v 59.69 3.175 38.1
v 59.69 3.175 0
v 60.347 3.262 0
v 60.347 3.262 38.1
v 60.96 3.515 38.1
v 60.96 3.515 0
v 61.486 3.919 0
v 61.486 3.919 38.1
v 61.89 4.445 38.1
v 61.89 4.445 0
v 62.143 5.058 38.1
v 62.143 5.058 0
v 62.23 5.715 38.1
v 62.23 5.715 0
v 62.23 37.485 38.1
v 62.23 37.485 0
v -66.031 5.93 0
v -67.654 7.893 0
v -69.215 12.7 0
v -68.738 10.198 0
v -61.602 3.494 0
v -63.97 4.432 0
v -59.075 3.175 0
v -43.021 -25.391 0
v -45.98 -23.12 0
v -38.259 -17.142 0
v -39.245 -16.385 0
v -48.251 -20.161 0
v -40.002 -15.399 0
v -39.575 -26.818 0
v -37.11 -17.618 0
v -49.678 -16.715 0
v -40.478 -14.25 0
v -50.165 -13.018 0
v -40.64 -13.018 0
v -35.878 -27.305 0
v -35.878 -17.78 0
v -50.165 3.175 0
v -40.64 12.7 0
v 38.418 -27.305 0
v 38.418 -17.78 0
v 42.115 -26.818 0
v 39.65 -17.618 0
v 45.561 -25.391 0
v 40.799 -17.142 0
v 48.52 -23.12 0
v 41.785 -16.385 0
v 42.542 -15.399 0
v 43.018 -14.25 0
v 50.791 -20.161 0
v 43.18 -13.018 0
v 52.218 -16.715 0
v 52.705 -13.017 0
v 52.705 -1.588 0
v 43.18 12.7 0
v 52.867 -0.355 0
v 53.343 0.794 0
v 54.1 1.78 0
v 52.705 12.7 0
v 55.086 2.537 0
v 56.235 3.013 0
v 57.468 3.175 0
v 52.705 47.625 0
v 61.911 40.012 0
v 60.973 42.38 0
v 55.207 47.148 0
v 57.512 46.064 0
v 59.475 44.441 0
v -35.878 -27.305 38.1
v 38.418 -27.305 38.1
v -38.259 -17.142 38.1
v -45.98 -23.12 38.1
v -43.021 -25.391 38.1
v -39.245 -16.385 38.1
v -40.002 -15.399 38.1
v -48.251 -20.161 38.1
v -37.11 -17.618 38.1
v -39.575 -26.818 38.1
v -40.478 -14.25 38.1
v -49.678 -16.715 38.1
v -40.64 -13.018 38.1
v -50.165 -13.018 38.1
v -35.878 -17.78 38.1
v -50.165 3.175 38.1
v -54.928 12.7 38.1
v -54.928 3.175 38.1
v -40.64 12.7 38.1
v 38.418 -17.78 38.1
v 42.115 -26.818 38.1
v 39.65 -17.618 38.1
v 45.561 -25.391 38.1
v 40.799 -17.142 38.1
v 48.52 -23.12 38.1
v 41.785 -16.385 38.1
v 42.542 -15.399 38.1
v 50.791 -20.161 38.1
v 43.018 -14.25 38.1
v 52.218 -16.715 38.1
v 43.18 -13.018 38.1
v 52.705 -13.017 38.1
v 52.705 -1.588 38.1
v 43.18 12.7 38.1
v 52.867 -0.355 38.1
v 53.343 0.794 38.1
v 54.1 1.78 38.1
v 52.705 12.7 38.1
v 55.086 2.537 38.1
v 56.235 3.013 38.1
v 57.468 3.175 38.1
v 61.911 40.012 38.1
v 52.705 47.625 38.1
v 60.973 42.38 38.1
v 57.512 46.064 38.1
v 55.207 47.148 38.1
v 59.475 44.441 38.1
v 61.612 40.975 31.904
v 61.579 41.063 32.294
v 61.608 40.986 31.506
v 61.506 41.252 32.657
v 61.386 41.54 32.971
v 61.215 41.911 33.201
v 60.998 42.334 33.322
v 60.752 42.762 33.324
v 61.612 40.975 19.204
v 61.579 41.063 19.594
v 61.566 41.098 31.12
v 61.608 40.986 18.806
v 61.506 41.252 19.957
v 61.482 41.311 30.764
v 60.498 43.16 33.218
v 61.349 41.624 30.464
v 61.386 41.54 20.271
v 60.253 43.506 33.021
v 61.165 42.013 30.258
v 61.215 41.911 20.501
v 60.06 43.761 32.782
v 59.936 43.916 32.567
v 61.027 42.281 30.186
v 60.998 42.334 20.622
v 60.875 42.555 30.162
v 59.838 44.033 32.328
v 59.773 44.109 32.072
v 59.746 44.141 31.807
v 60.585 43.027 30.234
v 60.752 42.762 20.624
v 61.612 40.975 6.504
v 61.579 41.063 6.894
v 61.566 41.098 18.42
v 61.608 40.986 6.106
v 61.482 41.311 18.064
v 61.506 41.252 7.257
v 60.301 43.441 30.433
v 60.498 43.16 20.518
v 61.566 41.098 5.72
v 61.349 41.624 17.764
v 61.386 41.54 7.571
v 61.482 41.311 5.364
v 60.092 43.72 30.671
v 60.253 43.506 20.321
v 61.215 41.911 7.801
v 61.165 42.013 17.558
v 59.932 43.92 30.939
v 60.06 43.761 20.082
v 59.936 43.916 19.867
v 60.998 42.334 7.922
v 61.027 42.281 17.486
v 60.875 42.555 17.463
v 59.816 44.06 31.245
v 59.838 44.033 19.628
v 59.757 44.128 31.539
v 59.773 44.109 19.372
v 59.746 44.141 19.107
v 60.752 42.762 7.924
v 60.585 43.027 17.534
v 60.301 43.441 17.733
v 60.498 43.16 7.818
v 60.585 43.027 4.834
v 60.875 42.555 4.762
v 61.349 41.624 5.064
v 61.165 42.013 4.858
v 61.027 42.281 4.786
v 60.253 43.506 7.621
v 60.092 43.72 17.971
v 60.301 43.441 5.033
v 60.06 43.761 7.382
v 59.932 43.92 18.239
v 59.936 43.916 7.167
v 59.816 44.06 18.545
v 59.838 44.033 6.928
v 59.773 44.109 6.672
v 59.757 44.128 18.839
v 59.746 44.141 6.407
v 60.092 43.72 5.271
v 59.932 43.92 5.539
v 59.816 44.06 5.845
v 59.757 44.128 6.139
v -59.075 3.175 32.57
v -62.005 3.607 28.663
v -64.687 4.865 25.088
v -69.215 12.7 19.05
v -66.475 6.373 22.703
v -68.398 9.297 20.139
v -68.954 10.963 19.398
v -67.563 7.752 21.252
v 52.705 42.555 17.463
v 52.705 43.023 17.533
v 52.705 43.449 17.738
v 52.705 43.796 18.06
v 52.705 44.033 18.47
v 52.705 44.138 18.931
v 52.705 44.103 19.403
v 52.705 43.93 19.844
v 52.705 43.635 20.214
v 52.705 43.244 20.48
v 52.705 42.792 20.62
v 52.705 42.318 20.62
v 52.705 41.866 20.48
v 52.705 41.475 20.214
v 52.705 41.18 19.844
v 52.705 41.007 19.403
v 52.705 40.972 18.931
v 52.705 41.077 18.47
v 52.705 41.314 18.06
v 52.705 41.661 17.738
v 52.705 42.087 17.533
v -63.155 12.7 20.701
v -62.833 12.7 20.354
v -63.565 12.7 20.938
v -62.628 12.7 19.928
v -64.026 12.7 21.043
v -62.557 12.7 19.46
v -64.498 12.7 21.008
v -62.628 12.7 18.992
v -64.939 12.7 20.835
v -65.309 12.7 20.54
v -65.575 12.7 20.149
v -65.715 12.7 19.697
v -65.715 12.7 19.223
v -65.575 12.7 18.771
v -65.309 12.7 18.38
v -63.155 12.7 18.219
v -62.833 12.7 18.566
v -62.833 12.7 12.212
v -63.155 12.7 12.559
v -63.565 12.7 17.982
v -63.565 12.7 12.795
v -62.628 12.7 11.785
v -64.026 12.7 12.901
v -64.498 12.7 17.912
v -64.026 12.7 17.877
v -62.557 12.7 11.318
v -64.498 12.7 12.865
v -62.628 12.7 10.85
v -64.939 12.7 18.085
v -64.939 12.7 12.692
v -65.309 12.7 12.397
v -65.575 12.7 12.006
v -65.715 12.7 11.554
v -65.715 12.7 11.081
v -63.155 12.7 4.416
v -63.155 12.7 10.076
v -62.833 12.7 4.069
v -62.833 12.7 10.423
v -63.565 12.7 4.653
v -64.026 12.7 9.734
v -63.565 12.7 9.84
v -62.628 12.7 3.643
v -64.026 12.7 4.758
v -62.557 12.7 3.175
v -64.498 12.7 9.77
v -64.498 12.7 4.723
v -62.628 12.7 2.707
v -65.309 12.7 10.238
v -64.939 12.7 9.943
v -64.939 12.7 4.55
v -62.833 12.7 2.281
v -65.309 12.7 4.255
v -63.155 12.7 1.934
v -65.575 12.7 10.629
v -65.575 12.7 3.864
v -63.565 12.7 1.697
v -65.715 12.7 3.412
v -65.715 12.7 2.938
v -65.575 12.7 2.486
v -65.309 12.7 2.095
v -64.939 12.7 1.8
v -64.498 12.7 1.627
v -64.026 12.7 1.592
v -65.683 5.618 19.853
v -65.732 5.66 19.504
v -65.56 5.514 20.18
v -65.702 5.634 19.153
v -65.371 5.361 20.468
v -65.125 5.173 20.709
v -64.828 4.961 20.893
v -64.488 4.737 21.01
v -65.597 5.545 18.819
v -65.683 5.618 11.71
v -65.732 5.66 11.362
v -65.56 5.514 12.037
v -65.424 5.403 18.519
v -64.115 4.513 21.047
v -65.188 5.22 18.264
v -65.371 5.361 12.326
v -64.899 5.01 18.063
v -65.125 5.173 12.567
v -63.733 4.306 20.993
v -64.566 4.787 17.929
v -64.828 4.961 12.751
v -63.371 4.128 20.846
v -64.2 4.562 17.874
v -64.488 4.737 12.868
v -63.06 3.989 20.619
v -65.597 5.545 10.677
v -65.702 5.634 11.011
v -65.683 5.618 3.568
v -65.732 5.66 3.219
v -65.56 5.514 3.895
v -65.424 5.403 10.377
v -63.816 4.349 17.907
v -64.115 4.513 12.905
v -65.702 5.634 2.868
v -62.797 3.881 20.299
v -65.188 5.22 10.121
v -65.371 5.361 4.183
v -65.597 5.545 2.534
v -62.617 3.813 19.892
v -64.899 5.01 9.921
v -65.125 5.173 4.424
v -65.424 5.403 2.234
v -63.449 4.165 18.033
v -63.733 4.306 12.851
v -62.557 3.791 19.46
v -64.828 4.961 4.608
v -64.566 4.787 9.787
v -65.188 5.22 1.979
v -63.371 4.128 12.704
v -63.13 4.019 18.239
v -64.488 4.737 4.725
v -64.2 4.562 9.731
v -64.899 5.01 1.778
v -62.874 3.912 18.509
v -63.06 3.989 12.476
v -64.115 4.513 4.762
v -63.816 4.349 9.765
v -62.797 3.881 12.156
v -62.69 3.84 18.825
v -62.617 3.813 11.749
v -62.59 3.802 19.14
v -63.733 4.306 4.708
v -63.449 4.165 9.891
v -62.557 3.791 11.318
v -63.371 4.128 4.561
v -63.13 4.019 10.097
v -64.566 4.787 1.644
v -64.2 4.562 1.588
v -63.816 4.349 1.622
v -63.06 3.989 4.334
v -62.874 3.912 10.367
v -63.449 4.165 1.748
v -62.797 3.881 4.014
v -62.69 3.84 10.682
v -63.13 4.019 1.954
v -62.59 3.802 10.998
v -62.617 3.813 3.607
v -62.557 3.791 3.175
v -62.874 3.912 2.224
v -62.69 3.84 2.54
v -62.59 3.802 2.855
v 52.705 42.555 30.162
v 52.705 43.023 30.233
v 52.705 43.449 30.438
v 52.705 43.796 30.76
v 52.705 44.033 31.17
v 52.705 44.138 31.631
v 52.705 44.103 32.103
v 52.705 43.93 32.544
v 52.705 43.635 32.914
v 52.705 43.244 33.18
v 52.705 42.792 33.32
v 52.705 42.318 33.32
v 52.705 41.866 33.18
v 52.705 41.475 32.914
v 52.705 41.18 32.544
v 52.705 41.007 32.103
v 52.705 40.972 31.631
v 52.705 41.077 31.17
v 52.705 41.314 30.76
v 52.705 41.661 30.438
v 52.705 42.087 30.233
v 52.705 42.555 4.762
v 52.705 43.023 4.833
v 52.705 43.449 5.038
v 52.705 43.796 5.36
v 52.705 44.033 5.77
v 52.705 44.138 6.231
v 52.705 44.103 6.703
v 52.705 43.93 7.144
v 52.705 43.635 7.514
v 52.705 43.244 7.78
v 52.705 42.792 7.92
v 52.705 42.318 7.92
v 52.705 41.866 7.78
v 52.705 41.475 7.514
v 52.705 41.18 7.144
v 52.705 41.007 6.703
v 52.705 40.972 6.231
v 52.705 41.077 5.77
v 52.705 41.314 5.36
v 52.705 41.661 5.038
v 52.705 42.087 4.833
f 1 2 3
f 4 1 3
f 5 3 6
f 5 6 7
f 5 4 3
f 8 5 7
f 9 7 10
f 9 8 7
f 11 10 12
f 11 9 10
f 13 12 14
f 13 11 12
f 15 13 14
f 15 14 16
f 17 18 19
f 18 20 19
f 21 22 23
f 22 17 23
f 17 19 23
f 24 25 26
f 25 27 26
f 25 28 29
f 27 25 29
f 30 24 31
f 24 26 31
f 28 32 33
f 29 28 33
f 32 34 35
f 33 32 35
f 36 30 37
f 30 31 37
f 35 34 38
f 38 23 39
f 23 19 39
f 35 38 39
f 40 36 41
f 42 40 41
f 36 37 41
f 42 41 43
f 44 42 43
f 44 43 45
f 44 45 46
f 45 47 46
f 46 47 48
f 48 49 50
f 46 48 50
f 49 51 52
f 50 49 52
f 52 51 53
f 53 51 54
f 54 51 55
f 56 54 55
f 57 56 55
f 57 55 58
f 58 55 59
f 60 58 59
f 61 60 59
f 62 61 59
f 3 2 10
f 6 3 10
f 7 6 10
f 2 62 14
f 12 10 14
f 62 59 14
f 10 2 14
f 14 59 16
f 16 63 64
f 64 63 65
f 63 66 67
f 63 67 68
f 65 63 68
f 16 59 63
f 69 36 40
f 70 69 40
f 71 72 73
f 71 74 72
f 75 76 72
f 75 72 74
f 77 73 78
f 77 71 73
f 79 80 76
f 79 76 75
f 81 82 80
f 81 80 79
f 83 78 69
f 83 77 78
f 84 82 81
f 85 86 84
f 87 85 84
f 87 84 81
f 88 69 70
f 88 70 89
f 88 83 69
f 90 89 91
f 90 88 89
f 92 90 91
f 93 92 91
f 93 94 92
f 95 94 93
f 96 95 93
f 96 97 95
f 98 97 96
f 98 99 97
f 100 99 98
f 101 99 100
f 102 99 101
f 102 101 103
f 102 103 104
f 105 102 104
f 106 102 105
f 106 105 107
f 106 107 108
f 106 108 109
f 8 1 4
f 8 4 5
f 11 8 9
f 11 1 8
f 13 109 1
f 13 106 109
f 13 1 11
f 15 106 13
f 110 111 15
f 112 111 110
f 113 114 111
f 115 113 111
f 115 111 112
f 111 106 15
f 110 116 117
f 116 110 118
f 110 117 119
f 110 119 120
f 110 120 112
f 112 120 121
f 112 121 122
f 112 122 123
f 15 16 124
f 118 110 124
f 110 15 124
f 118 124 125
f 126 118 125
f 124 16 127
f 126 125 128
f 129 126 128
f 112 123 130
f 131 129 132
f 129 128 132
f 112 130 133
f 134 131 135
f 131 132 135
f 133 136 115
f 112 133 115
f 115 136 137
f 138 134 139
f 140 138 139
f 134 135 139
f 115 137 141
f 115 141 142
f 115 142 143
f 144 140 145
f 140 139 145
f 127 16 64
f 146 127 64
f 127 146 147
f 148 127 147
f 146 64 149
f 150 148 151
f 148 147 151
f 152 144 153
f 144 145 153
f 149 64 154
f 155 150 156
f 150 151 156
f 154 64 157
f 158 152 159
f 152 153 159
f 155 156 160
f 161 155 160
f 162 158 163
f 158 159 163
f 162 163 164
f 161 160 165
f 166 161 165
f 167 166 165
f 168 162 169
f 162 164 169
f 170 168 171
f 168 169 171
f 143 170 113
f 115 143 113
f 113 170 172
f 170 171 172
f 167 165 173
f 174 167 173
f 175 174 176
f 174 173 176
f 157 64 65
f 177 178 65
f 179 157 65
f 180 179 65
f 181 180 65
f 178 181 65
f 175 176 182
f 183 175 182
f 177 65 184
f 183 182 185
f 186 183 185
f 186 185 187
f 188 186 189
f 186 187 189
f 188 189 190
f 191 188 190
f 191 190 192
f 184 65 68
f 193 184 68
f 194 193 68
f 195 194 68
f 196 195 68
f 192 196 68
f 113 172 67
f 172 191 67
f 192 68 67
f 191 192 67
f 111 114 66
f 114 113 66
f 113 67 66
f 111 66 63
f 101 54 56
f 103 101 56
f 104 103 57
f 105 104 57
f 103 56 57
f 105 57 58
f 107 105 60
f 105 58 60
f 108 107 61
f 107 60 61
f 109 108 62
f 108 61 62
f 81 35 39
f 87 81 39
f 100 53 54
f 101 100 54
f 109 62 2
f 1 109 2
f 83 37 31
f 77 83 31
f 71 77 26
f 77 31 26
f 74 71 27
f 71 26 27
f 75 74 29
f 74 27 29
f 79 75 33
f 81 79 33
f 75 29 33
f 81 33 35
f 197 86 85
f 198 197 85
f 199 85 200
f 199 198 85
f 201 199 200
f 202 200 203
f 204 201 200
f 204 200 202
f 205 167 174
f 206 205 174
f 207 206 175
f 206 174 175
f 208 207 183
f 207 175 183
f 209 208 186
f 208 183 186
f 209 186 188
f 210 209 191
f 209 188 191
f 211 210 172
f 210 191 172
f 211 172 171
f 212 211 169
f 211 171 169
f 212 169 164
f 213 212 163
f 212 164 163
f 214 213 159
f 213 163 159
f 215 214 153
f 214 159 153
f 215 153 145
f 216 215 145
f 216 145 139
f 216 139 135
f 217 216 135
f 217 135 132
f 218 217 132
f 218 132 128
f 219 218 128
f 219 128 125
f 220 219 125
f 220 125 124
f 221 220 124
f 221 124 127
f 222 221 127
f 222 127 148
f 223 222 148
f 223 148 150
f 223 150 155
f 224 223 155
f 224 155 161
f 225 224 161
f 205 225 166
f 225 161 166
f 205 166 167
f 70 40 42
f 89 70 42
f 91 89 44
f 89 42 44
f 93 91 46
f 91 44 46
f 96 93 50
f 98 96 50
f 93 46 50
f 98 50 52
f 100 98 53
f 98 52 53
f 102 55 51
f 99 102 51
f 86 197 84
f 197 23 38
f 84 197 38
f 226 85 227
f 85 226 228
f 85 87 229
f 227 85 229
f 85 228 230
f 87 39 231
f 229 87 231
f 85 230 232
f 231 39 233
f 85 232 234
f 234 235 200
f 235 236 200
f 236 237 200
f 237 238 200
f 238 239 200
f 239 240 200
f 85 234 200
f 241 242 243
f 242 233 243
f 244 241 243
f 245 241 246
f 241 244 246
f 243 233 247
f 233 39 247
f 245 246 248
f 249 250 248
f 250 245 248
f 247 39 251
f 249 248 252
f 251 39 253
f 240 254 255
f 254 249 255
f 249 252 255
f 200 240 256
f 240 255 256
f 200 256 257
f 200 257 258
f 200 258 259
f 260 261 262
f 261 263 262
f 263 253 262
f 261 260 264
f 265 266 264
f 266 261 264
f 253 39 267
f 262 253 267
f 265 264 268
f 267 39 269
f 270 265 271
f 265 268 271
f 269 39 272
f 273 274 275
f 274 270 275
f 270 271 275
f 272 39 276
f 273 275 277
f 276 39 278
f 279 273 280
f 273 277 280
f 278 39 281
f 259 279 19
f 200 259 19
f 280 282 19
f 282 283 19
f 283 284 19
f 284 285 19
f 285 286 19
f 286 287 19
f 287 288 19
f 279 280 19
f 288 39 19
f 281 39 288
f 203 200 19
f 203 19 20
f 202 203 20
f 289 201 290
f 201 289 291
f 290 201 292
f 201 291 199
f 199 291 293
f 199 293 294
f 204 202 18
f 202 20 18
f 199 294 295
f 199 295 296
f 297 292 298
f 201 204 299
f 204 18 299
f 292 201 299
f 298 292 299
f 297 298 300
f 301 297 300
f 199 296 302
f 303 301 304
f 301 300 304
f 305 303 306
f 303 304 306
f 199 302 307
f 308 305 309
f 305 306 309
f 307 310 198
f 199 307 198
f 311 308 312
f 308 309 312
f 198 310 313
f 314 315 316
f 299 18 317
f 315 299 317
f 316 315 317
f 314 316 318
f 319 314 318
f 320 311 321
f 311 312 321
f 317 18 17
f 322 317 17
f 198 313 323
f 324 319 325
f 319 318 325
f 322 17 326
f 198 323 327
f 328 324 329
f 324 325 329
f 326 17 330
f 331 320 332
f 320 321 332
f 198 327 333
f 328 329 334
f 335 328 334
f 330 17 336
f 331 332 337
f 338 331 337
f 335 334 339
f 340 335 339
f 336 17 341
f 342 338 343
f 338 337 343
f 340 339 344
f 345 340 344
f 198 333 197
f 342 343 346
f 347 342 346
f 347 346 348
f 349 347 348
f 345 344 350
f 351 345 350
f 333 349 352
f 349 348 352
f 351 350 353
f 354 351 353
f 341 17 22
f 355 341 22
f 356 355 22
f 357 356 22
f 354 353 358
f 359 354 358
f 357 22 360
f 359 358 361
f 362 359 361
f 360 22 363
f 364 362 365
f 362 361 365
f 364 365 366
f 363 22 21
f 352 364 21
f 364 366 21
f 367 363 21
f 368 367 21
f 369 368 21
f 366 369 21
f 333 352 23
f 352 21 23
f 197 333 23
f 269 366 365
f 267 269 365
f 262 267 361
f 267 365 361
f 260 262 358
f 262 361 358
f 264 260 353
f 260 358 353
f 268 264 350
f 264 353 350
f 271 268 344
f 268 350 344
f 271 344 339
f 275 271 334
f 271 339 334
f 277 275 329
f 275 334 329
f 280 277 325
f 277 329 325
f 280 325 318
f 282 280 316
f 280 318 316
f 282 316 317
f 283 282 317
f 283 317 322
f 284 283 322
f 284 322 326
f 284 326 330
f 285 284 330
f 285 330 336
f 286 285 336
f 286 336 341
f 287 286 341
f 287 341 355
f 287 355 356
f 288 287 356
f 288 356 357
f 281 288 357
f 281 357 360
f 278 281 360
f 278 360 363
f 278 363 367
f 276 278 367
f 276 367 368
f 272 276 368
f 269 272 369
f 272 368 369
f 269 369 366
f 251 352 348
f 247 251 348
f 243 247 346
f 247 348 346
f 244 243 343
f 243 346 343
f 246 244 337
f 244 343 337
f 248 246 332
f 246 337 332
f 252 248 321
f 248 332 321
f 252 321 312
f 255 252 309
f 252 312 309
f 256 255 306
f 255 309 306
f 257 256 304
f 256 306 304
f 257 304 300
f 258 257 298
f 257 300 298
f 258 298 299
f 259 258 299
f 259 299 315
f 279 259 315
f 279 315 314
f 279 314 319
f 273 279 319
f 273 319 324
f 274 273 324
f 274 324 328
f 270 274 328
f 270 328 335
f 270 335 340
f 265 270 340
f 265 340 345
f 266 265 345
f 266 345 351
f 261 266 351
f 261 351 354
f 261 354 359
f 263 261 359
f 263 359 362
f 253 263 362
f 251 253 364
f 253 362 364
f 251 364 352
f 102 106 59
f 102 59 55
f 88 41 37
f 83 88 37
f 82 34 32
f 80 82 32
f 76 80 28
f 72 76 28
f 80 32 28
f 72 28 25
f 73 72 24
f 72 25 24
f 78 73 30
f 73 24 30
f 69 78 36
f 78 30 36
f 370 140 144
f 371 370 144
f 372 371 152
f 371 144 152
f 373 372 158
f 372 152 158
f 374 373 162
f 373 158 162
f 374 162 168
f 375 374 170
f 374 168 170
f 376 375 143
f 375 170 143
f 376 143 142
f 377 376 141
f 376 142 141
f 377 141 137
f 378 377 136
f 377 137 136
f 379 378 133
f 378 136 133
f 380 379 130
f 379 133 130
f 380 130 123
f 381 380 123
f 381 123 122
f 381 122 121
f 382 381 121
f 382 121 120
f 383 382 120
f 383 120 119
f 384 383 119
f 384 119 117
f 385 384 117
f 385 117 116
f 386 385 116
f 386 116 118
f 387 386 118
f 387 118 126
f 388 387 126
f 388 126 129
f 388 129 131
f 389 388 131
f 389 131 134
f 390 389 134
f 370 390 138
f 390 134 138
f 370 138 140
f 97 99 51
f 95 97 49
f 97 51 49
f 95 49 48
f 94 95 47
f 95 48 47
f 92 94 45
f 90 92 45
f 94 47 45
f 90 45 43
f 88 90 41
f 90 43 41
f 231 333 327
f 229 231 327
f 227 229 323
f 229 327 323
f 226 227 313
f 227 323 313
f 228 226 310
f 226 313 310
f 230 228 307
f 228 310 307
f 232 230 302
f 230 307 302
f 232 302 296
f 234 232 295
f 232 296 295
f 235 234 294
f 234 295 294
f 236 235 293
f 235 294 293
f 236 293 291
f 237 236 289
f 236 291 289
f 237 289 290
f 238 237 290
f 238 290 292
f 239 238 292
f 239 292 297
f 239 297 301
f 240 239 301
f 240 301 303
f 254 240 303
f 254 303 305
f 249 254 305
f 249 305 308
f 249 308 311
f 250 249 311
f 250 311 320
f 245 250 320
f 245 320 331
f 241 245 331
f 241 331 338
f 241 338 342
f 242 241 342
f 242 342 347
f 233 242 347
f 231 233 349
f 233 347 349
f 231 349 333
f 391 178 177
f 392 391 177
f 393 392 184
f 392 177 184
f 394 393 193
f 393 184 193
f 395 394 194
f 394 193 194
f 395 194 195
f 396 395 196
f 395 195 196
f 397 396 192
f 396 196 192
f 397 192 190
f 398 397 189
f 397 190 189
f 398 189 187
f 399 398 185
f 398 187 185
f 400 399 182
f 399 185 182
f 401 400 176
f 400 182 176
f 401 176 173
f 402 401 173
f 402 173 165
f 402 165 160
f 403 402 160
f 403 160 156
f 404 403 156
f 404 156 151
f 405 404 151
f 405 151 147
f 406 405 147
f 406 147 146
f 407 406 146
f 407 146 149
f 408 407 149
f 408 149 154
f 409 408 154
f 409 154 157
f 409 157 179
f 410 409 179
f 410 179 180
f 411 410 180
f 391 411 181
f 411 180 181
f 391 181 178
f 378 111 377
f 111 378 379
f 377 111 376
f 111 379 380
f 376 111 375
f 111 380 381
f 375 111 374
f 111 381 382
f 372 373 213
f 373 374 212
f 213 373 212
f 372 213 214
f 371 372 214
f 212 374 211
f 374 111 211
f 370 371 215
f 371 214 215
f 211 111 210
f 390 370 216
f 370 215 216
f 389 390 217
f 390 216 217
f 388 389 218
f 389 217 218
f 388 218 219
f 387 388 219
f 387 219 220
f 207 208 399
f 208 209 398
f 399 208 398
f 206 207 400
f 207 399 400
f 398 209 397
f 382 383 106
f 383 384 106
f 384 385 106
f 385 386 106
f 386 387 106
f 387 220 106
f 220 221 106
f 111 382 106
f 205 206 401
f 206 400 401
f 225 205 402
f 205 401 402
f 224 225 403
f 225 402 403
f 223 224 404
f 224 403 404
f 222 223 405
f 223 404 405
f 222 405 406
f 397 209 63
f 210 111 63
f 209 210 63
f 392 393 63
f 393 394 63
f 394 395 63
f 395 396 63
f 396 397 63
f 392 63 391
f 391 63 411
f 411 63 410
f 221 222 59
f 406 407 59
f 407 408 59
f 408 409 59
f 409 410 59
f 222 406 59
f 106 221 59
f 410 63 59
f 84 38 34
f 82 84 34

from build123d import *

# Parameters (mm, degrees)
BOSS_EXTRUDE1_DEPTH = 38.1
FILLET1_R           = 2.54
FILLET2_R           = 10.16
CUT_EXTRUDE2_DEPTH  = 91.653895256
SKETCH3_R           = 1.5875
CUT_EXTRUDE3_DEPTH  = 91.653895256
SKETCH4_R           = 1.5875
CUT_EXTRUDE4_DEPTH  = 145.905274839


with BuildPart() as part:
    # Sketch1 → Boss-Extrude1 (new body)
    with BuildSketch(Plane.XY):
        with BuildLine():
            Line((-35.8775, -27.305), (38.4175, -27.305))
            ThreePointArc((38.4175, -27.305), (48.520288136, -23.120288136), (52.705, -13.0175))
            Line((52.705, -13.0175), (52.705, -1.5875))
            ThreePointArc((52.705, -1.5875), (54.099903955, 1.780096045), (57.4675, 3.175))
            Line((57.4675, 3.175), (62.23, 3.175))
            Line((62.23, 3.175), (62.23, 47.625))
            Line((62.23, 47.625), (52.705, 47.625))
            Line((52.705, 47.625), (52.705, 12.7))
            Line((52.705, 12.7), (43.18, 12.7))
            Line((43.18, 12.7), (43.18, -13.0175))
            ThreePointArc((43.18, -13.0175), (41.785096045, -16.385096045), (38.4175, -17.78))
            Line((38.4175, -17.78), (-35.8775, -17.78))
            ThreePointArc((-35.8775, -17.78), (-39.245096045, -16.385096045), (-40.64, -13.0175))
            Line((-40.64, -13.0175), (-40.64, 12.7))
            Line((-40.64, 12.7), (-50.165, 12.7))
            Line((-50.165, 12.7), (-59.69, 12.7))
            Line((-59.69, 12.7), (-69.215, 12.7))
            Line((-69.215, 12.7), (-69.215, 3.175))
            Line((-69.215, 3.175), (-50.165, 3.175))
            Line((-50.165, 3.175), (-50.165, -13.0175))
            ThreePointArc((-50.165, -13.0175), (-45.980288136, -23.120288136), (-35.8775, -27.305))
        make_face()
    extrude(amount=BOSS_EXTRUDE1_DEPTH)

    # Fillet1
    fillet1_edges = [part.edges().sort_by_distance(p)[0] for p in [
        (62.23, 3.175, 19.05),
    ]]
    fillet(fillet1_edges, radius=FILLET1_R)

    # Fillet2
    # the kernel refuses this fillet: 10.16 mm, written as the material it takes off along each edge
    with BuildSketch(Plane(origin=(-69.215, 3.175, -25.350342083), x_dir=(1, 0, 0), z_dir=(0, 0, 1))) as fillet2_piece_1:
        with BuildLine():
            CenterArc((10.140136833, 10.16), FILLET2_R, 183.583321698, 86.416678302)
            Line((0, 9.525), (-0.202802737, 9.5123))
            ThreePointArc((-0.202802737, 9.5123), (-0.2032, 4.7625), (-0.2032, 0))
            Line((-0.2032, 0), (0, -0.2032))
            Line((0, -0.2032), (10.140136833, -0.2032))
            Line((10.140136833, -0.2032), (10.140136833, 0))
        make_face()
    extrude(amount=88.800684167, mode=Mode.SUBTRACT)
    with BuildSketch(Plane(origin=(62.23, 47.625, -25.350342083), x_dir=(0, -1, 0), z_dir=(0, 0, 1))) as fillet2_piece_2:
        with BuildLine():
            CenterArc((10.140136833, -10.16), FILLET2_R, 90, 86.416678302)
            Line((0, -9.525), (-0.202802737, -9.5123))
            ThreePointArc((-0.202802737, -9.5123), (-0.2032, -4.7625), (-0.2032, 0))
            Line((-0.2032, 0), (0, 0.2032))
            Line((0, 0.2032), (10.140136833, 0.2032))
            Line((10.140136833, 0.2032), (10.140136833, 0))
        make_face()
    extrude(amount=88.800684167, mode=Mode.SUBTRACT)

    # Sketch2 → Cut-Extrude2 (cut, through all)
    with BuildSketch(Plane.XZ.offset(-3.175)):
        Polygon((-69.215, 19.05), (-69.215, 44.45), (-50.165, 44.45), align=None)
    extrude(amount=-CUT_EXTRUDE2_DEPTH, mode=Mode.SUBTRACT)

    # Sketch3 → Cut-Extrude3 (cut, through all)
    with BuildSketch(Plane.XZ.offset(-3.175)):
        with Locations((-64.144931583, 3.175)):
            Circle(SKETCH3_R)
        with Locations((-64.144931583, 11.317545611)):
            Circle(SKETCH3_R)
        with Locations((-64.144931583, 19.460091222)):
            Circle(SKETCH3_R)
    extrude(amount=-CUT_EXTRUDE3_DEPTH, mode=Mode.SUBTRACT)

    # Sketch4 → Cut-Extrude4 (cut, through all)
    with BuildSketch(Plane(origin=(62.23, 0, 0), x_dir=(0, 0, -1), z_dir=(1, 0, 0))):
        with Locations((-6.35, 42.554931583)):
            Circle(SKETCH4_R)
        with Locations((-19.05, 42.554931583)):
            Circle(SKETCH4_R)
        with Locations((-31.75, 42.554931583)):
            Circle(SKETCH4_R)
    extrude(amount=-CUT_EXTRUDE4_DEPTH, mode=Mode.SUBTRACT)


solid = part.part
